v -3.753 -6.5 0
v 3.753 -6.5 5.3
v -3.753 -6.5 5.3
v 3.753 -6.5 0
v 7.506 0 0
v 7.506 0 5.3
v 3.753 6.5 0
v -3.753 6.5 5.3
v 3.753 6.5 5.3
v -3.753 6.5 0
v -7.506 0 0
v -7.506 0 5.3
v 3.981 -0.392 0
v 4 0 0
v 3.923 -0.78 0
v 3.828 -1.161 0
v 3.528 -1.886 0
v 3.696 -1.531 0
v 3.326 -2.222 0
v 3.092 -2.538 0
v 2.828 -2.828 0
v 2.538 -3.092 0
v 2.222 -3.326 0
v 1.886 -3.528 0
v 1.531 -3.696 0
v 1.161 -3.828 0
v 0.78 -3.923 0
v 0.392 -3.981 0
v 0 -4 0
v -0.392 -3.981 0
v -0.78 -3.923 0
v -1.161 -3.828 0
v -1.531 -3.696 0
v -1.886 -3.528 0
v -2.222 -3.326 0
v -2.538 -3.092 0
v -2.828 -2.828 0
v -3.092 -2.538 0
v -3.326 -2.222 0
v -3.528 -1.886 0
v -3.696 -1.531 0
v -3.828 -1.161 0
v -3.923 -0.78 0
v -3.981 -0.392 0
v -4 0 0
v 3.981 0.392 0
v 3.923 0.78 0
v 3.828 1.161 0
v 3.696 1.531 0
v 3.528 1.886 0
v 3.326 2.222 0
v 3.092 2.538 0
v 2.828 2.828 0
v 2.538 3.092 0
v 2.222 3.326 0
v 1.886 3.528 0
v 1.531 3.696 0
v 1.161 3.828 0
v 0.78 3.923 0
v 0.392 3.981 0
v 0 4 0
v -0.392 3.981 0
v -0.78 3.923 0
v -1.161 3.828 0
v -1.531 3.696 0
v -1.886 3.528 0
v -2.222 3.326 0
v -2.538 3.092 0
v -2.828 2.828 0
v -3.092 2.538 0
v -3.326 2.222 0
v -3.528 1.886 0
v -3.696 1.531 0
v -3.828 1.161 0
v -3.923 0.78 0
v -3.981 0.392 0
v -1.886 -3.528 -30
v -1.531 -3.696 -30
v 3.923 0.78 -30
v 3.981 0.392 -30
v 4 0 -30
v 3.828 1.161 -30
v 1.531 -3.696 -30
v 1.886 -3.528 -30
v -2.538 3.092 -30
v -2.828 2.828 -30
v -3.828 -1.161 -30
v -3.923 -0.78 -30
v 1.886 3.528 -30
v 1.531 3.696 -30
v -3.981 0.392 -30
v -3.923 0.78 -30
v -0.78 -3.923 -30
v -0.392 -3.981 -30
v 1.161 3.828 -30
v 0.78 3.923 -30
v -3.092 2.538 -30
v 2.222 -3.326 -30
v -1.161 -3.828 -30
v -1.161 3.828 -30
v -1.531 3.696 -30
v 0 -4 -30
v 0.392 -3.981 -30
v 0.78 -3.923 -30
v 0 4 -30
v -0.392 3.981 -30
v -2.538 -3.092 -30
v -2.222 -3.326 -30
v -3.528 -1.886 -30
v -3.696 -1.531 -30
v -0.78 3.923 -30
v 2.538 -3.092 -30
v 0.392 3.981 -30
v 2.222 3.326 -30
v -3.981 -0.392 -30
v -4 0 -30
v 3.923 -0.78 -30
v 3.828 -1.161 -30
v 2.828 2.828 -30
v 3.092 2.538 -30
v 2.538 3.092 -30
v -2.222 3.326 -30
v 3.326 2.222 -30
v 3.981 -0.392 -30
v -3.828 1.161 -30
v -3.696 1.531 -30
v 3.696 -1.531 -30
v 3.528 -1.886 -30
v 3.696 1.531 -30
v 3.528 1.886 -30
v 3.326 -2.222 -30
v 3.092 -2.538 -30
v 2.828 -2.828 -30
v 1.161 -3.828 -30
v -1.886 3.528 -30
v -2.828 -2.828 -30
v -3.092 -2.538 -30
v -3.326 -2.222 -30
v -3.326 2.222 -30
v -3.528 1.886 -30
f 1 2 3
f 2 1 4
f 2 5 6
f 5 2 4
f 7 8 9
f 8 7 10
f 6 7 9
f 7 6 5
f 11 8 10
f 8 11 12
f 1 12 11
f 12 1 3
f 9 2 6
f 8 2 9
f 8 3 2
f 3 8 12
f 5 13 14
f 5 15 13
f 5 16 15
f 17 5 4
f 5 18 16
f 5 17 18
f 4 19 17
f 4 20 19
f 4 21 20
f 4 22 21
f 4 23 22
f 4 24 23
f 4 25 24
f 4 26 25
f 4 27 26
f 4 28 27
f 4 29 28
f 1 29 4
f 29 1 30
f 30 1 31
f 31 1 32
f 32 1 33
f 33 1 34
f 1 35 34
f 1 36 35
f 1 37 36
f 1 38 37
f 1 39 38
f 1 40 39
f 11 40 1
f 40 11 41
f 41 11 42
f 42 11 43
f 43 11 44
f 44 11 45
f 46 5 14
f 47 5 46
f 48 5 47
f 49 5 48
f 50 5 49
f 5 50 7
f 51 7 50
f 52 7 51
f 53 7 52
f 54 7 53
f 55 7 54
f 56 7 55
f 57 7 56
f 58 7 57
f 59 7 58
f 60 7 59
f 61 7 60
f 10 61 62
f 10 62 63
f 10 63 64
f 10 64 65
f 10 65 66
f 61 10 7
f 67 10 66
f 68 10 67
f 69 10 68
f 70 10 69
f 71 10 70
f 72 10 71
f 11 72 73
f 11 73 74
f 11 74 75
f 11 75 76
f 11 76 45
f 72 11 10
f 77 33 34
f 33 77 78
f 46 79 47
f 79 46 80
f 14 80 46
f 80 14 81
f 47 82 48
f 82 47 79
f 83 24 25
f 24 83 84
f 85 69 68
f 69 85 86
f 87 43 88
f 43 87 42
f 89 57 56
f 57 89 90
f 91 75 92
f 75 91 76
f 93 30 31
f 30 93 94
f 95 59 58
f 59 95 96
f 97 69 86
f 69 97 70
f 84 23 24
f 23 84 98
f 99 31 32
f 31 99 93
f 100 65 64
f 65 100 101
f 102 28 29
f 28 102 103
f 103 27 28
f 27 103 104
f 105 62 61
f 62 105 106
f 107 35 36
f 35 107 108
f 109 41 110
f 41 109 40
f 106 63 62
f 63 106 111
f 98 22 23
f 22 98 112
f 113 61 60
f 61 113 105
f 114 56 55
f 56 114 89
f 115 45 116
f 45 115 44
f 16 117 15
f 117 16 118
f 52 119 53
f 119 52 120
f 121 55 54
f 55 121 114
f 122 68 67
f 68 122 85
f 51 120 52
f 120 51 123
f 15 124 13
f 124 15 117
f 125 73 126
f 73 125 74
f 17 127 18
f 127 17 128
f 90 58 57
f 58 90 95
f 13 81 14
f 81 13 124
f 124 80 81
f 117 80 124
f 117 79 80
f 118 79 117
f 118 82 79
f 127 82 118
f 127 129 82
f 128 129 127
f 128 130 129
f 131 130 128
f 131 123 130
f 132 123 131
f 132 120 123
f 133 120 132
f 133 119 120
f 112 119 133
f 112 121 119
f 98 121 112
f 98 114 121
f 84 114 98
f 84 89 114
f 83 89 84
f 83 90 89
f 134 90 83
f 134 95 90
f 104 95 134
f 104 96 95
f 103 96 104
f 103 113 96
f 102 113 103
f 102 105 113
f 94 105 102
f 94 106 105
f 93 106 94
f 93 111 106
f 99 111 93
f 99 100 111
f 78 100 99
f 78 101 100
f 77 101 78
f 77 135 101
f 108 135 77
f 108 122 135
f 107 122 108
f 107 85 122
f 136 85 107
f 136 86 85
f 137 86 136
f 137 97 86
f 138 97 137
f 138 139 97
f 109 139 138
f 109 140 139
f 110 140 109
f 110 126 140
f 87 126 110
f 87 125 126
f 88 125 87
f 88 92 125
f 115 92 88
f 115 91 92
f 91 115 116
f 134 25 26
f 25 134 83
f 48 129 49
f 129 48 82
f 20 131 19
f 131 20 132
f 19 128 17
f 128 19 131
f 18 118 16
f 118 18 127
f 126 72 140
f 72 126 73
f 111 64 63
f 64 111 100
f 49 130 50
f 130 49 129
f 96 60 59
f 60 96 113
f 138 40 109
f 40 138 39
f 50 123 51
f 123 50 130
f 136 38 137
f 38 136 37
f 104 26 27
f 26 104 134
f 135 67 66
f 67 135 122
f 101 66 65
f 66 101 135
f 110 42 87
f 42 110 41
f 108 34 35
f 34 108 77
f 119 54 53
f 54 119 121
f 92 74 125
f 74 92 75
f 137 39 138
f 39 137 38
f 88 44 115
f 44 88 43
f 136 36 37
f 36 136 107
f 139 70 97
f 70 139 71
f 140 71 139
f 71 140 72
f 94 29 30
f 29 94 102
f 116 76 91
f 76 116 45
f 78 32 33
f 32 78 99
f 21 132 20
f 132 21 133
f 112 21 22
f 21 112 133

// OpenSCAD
union() {
    // Head
    cylinder(h = 5.3, r = 13 / sqrt(3), $fn = 6);

    // Shank
    translate([0, 0, -30])
        cylinder(h = 30, r = 4, $fn = 64);
}
